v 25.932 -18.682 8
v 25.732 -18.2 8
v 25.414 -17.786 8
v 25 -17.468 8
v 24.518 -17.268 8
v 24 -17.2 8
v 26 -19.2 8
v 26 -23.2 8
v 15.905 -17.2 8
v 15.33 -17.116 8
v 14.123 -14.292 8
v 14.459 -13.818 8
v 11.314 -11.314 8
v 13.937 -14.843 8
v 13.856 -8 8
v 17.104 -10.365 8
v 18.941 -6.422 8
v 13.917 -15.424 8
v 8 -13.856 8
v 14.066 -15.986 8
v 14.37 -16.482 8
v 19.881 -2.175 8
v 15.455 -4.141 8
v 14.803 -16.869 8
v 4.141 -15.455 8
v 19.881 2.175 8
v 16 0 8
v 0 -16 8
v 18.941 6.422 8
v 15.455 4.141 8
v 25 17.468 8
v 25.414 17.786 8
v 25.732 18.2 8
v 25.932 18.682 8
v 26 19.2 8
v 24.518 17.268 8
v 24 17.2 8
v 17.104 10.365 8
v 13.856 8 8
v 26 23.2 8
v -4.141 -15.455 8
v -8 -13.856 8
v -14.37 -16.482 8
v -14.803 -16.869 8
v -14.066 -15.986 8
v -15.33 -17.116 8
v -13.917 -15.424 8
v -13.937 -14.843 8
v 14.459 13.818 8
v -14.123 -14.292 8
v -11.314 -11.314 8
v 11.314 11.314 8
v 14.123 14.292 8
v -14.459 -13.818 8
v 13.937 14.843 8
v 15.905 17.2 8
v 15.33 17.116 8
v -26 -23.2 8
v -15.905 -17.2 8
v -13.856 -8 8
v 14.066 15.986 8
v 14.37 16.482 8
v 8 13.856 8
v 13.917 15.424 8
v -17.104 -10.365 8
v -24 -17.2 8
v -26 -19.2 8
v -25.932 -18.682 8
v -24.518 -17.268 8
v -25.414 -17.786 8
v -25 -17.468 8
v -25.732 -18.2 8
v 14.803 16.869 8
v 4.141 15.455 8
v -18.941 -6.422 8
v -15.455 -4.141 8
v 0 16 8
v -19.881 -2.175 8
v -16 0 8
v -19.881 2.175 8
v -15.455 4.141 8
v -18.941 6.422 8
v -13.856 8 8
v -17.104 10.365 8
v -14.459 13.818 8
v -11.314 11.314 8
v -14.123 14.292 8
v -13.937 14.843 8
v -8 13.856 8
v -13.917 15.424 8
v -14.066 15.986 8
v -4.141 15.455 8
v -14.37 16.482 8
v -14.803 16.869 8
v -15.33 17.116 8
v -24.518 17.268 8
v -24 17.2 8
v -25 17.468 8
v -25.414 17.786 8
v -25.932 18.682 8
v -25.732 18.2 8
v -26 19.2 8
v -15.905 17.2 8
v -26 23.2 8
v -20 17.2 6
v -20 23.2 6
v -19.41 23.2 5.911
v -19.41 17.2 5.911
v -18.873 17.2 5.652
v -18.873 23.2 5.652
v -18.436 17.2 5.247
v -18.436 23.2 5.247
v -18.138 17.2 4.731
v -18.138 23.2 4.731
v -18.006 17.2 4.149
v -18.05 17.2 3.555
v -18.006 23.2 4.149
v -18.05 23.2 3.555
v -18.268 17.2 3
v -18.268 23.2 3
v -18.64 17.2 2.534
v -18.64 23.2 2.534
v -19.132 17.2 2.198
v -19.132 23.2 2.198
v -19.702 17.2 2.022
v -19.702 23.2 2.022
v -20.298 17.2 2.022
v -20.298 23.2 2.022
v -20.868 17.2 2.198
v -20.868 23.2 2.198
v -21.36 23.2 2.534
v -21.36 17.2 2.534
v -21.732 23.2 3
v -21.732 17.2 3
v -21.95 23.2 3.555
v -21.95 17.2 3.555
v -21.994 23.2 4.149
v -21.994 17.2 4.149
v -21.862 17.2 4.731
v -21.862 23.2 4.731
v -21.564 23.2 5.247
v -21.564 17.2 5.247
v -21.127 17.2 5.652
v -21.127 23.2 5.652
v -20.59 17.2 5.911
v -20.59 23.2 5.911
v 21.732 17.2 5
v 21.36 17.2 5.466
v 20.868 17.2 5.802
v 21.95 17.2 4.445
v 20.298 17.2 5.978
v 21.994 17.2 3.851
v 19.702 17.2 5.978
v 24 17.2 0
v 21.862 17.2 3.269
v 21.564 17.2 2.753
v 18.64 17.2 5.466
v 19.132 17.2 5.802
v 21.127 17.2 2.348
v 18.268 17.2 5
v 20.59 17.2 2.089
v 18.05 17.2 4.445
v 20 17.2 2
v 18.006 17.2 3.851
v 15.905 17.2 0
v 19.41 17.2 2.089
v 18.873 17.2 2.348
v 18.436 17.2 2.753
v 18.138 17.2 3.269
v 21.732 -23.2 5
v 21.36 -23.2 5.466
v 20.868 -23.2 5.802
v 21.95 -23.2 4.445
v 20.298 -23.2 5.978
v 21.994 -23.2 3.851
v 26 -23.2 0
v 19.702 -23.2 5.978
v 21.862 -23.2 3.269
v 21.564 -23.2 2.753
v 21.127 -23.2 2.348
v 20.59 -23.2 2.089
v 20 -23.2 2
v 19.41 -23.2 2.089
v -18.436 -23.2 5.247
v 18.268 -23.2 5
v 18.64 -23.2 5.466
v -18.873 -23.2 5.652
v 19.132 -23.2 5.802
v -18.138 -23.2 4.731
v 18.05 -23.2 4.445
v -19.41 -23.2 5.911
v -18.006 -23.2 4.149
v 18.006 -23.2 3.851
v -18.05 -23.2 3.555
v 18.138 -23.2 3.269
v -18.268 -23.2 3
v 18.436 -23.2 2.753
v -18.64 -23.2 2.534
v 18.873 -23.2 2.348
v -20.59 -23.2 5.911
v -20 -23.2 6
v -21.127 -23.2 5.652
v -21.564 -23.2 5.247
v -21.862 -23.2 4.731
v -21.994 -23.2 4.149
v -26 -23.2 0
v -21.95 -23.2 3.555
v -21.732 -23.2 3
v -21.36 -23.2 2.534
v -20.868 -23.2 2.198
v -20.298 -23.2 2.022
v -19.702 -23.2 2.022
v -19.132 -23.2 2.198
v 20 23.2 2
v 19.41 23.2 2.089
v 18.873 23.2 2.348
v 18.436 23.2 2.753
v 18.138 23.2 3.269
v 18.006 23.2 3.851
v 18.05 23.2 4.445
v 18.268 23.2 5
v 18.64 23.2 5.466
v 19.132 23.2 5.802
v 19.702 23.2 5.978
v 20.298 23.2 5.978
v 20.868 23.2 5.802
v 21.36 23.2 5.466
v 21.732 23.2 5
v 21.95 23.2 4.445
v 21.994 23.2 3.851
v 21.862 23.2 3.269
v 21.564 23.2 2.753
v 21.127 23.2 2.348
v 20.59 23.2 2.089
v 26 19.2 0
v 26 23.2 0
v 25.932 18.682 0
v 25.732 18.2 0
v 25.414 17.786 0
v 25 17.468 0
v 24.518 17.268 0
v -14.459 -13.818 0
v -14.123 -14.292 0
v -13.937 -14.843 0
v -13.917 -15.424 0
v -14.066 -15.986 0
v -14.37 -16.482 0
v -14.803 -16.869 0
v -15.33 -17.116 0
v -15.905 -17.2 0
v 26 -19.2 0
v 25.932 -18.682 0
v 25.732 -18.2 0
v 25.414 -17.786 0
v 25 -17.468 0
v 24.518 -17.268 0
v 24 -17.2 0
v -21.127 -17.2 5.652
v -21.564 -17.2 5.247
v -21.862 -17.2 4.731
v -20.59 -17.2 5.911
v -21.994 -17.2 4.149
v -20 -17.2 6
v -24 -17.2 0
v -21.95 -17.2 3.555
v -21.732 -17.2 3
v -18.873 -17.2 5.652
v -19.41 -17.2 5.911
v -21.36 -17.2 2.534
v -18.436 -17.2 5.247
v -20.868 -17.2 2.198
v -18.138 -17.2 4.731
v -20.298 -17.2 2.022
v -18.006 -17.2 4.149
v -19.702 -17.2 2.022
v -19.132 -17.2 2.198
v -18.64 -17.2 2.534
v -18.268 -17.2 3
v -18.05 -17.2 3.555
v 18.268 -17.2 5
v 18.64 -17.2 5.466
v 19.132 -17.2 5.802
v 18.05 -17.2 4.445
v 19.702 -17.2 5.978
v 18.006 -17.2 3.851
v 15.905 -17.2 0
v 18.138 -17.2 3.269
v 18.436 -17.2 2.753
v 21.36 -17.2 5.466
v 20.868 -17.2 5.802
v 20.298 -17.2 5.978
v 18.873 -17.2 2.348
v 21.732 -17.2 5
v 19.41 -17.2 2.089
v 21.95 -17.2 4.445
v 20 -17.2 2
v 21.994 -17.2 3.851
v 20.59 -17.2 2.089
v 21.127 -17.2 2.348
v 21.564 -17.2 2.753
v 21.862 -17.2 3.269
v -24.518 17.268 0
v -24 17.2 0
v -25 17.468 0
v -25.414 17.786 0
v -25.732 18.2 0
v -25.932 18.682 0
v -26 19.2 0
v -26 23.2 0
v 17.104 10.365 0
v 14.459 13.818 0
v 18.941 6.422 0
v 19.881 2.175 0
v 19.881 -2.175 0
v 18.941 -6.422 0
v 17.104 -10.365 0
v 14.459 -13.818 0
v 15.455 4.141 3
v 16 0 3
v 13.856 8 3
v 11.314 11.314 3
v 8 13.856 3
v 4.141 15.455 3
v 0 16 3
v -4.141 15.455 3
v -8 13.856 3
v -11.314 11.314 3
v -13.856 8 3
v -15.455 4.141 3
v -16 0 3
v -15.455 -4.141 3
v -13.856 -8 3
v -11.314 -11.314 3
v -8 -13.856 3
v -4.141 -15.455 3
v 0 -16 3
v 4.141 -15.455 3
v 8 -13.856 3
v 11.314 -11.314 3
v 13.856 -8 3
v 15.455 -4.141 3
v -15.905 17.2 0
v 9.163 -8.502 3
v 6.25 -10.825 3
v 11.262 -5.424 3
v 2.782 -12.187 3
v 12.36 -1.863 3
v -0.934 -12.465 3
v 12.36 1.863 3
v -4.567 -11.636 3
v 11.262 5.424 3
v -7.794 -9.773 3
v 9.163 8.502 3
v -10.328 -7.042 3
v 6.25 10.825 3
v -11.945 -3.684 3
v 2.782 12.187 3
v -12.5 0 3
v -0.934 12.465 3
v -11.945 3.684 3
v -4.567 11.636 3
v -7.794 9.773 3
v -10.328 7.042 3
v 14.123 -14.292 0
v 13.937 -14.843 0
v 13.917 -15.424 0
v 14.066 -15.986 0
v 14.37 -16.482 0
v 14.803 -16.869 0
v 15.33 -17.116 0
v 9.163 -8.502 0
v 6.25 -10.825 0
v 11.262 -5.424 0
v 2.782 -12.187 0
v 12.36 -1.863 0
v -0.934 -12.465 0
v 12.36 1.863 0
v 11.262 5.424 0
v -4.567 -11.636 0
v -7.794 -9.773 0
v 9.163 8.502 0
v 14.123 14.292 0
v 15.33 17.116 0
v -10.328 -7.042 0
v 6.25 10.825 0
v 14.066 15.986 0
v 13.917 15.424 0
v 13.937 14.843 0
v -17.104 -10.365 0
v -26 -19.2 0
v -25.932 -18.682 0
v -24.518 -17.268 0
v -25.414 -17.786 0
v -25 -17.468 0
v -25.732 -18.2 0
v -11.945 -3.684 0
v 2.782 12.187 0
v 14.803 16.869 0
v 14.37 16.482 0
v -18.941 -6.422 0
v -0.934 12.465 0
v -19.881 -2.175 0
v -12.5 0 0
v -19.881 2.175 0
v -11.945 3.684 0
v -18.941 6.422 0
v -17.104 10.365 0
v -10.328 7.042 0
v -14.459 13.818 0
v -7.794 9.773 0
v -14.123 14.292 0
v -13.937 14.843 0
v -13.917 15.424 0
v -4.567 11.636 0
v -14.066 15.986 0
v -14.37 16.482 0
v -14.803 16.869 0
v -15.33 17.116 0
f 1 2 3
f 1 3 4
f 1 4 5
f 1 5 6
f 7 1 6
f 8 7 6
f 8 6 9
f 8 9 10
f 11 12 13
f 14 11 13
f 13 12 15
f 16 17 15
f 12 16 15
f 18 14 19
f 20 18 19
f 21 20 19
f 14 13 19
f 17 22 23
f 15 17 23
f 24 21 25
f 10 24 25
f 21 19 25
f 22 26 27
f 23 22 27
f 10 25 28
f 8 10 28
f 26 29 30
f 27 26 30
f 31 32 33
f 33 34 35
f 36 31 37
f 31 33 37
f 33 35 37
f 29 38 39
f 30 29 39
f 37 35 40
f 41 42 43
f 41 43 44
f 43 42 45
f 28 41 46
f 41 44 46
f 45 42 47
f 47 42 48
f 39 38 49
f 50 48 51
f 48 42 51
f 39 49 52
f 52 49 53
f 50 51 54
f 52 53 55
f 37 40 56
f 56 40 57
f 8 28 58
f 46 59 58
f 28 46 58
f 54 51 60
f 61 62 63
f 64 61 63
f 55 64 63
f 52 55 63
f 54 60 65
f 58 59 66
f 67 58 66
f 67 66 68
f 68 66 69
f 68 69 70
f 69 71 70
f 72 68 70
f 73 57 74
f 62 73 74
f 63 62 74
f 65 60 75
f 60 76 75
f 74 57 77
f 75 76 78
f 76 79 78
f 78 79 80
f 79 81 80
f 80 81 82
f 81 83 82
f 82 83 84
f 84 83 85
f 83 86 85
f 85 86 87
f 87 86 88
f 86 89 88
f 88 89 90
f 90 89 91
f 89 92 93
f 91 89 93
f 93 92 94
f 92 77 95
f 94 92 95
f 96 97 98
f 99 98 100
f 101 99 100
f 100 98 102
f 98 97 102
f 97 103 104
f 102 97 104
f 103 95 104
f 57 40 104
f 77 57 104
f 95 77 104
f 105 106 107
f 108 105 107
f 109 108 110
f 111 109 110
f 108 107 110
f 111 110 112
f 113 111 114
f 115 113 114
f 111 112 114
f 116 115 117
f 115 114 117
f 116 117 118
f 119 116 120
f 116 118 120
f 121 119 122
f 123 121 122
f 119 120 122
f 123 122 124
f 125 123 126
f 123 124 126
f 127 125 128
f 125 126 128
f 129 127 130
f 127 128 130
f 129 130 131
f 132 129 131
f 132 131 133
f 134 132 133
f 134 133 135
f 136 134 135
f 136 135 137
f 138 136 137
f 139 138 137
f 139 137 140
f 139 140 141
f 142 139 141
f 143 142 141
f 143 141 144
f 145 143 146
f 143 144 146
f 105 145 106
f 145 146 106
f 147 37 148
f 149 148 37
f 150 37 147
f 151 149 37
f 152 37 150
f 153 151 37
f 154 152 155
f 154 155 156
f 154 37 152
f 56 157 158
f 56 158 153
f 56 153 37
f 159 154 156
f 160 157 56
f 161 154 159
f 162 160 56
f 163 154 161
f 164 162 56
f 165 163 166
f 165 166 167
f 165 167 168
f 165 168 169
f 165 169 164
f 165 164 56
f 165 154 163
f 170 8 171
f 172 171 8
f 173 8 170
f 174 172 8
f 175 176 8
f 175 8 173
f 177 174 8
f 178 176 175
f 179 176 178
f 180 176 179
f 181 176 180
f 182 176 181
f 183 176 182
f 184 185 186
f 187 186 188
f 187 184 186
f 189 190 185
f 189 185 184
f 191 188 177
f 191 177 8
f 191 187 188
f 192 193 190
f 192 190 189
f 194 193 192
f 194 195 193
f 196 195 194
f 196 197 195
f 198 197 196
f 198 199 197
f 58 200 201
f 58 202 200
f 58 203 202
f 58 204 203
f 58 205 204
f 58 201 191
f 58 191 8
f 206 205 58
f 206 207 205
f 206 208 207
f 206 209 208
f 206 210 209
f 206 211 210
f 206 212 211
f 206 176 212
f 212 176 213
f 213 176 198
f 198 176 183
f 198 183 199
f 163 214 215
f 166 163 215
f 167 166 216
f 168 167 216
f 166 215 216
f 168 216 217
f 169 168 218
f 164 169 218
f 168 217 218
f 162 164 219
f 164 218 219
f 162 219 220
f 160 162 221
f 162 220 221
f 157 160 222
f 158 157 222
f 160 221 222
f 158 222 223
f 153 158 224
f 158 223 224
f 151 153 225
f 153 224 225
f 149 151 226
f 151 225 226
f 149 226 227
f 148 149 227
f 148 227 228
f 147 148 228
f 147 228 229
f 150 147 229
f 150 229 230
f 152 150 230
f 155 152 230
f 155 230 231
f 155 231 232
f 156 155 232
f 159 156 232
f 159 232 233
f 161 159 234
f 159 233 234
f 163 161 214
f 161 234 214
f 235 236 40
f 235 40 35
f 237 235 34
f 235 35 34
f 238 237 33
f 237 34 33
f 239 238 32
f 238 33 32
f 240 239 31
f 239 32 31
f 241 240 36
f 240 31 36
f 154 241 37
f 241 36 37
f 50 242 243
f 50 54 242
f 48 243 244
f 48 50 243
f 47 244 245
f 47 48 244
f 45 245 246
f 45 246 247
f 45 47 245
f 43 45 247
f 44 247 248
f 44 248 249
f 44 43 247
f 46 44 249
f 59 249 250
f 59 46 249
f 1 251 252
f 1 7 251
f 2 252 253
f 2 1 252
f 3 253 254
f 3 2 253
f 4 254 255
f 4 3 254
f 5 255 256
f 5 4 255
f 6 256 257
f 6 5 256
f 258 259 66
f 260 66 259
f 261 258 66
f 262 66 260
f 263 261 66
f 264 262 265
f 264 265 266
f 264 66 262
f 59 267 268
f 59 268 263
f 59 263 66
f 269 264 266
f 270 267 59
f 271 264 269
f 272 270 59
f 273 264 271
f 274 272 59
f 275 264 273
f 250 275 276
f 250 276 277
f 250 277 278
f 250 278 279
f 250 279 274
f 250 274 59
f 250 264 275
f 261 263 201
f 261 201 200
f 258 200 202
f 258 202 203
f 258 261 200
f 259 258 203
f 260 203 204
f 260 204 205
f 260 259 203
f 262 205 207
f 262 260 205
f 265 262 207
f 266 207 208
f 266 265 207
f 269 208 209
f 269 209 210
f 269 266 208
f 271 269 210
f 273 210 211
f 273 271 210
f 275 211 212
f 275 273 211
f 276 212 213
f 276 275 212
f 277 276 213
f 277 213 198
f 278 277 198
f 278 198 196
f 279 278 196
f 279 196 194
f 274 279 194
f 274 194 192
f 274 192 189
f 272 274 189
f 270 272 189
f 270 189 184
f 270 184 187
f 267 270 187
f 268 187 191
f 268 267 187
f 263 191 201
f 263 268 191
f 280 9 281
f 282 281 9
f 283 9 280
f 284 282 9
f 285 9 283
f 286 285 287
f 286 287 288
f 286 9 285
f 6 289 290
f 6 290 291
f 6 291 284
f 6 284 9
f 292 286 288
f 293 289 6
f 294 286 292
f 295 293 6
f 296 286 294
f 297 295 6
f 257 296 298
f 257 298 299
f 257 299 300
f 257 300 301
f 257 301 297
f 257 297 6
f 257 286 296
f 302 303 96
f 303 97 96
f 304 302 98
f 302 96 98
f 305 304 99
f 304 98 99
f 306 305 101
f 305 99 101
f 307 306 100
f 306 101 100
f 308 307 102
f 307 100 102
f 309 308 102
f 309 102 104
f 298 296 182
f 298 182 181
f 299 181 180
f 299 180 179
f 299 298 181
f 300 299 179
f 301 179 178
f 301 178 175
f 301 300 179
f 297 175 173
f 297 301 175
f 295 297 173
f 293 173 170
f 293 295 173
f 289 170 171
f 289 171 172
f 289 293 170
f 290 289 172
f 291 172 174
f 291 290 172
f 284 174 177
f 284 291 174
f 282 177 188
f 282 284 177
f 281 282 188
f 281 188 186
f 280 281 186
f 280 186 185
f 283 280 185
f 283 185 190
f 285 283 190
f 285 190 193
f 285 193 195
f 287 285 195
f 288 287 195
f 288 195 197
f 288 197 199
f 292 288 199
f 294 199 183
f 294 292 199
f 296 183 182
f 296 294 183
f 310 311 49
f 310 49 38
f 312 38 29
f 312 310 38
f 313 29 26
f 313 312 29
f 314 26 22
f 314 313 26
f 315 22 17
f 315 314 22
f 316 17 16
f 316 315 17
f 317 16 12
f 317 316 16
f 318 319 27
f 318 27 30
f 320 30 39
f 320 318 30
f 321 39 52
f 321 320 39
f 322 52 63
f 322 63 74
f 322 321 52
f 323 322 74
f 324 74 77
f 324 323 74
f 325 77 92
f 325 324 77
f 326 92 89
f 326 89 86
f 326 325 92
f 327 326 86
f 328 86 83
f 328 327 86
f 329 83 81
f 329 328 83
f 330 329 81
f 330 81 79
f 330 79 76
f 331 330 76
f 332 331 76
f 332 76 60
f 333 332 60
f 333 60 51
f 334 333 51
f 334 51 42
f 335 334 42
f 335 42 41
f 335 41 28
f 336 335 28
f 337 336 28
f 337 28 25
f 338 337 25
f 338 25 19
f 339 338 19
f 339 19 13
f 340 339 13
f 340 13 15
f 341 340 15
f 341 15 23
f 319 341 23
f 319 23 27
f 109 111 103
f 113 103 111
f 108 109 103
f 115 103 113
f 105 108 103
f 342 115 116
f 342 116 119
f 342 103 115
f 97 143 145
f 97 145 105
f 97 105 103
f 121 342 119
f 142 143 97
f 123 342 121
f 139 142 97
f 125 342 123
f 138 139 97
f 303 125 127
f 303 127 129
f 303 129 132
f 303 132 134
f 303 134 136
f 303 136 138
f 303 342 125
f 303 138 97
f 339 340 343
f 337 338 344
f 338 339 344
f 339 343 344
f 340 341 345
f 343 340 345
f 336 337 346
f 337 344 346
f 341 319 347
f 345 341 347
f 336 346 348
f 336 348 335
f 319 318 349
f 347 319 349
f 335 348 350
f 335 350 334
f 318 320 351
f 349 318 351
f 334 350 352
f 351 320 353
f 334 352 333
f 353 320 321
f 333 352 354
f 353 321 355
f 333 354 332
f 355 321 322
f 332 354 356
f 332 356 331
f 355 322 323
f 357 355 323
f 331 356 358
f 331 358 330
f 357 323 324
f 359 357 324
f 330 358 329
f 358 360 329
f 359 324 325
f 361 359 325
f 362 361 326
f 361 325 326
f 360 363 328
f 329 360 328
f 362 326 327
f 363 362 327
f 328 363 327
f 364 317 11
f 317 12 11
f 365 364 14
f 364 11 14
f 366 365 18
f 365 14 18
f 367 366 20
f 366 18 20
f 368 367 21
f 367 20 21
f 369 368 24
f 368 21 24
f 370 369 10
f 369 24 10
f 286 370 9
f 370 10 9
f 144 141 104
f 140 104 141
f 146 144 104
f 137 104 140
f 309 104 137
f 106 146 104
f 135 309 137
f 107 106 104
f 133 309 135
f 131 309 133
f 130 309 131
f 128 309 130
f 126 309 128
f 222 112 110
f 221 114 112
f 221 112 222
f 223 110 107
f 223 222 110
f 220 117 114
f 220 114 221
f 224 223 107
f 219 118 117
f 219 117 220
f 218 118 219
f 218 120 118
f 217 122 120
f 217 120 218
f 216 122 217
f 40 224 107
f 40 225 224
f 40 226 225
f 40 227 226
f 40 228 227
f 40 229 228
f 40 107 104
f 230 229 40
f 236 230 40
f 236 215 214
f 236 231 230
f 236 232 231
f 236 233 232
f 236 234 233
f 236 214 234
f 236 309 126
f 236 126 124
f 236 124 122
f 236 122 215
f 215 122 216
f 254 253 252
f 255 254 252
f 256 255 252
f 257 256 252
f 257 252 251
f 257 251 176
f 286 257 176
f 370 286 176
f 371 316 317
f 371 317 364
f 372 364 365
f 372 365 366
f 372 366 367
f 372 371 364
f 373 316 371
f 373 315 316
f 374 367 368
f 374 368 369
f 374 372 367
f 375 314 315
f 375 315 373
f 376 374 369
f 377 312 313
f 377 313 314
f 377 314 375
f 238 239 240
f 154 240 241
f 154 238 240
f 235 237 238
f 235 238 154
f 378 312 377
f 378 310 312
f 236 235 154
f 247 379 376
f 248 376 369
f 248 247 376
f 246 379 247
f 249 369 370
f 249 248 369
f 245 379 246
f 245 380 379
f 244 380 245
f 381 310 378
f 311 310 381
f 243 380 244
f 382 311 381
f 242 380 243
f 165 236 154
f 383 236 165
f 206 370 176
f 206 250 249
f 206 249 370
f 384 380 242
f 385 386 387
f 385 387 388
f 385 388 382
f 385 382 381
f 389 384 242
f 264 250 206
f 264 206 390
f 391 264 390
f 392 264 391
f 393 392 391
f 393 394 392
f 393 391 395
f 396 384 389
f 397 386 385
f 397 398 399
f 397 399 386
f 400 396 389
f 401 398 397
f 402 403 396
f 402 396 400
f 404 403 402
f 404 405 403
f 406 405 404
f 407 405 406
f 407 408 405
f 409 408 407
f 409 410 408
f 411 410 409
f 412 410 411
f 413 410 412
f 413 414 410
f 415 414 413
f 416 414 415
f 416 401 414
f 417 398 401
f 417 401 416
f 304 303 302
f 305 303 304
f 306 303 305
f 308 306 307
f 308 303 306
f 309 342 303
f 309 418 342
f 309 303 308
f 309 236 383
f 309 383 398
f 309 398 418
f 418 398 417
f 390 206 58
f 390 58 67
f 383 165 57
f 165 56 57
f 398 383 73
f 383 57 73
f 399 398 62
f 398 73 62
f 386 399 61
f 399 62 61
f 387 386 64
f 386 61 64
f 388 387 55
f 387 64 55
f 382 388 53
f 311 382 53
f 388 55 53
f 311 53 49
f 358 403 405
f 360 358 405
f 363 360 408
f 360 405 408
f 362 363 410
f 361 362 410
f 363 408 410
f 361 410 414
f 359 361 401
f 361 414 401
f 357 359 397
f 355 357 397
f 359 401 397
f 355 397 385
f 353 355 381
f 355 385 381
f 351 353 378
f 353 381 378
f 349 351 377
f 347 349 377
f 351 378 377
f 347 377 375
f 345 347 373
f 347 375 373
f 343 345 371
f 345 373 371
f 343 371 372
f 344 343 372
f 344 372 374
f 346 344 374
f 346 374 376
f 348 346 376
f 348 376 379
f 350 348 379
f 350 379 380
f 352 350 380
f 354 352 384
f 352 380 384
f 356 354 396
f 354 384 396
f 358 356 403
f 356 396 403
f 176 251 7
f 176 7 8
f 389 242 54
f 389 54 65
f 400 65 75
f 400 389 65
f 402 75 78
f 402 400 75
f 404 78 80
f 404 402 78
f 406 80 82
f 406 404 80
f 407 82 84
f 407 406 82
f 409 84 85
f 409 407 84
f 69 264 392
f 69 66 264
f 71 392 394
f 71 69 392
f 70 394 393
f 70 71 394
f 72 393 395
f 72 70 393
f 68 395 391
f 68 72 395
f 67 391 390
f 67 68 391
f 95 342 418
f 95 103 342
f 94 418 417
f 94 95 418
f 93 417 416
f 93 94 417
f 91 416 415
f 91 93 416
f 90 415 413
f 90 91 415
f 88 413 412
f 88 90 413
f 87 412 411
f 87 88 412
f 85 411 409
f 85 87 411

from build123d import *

# Parameters (mm, degrees)
SKETCH_1_R          = 16
EXTRUDE_1_DEPTH     = 8
SKETCH_2_R          = 2
CUT_EXTRUDE_1_DEPTH = 6
CUT_EXTRUDE_START   = -6
SKETCH_3_R          = 2
CUT_EXTRUDE_2_DEPTH = 6
FILLET_1_R          = 2
FILLET_2_R          = 2
SKETCH_4_R          = 16
SKETCH_4_R_2        = 12.5
EXTRUDE_2_DEPTH     = 3


with BuildPart() as part:
    # 草图1 → 凸台-拉伸1 (new body)
    with BuildSketch(Plane.XY):
        with BuildLine():
            Line((-26, 23.2), (26, 23.2))
            Line((26, 23.2), (26, 17.2))
            Line((26, 17.2), (10.205880658, 17.2))
            ThreePointArc((10.205880658, 17.2), (20, 0), (10.205880658, -17.2))
            Line((10.205880658, -17.2), (26, -17.2))
            Line((26, -17.2), (26, -23.2))
            Line((26, -23.2), (-26, -23.2))
            Line((-26, -23.2), (-26, -17.2))
            Line((-26, -17.2), (-10.205880658, -17.2))
            ThreePointArc((-10.205880658, -17.2), (-20, 0), (-10.205880658, 17.2))
            Line((-10.205880658, 17.2), (-26, 17.2))
            Line((-26, 17.2), (-26, 23.2))
        make_face()
        Circle(SKETCH_1_R, mode=Mode.SUBTRACT)
    extrude(amount=EXTRUDE_1_DEPTH)

    # 草图2 → 切除-拉伸1 (cut)
    with BuildSketch(Plane(origin=(0, 23.2, 0), x_dir=(1, 0, 0), z_dir=(0, 1, 0))):
        with Locations(Location((-20, -4, 0), (0, 0, 270))):
            Circle(SKETCH_2_R)
        with Locations(Location((20, -4, 0), (0, 0, 90))):
            Circle(SKETCH_2_R)
    extrude(amount=-CUT_EXTRUDE_1_DEPTH, mode=Mode.SUBTRACT)

    # 草图3 → 切除-拉伸2 (cut)
    with BuildSketch(Plane.XZ.offset(23.2).offset(CUT_EXTRUDE_START)):
        with Locations(Location((20, 4, 0), (0, 0, 270))):
            Circle(SKETCH_3_R)
        with Locations(Location((-20, 4, 0), (0, 0, 90))):
            Circle(SKETCH_3_R)
    extrude(amount=CUT_EXTRUDE_2_DEPTH, mode=Mode.SUBTRACT)

    # 圆角1
    fillet_1_edges = [part.edges().sort_by_distance(p)[0] for p in [
        (-10.205880658, -17.2, 4),
        (-10.205880658, 17.2, 4),
        (10.205880658, 17.2, 4),
        (10.205880658, -17.2, 4),
    ]]
    fillet(fillet_1_edges, radius=FILLET_1_R)

    # 圆角2
    fillet_2_edges = [part.edges().sort_by_distance(p)[0] for p in [
        (-26, -17.2, 4),
        (-26, 17.2, 4),
        (26, 17.2, 4),
        (26, -17.2, 4),
    ]]
    fillet(fillet_2_edges, radius=FILLET_2_R)

    # 草图4 → 凸台-拉伸2 (add)
    with BuildSketch(Plane(origin=(0, 0, 0), x_dir=(-1, 0, 0), z_dir=(0, 0, -1))):
        Circle(SKETCH_4_R)
        Circle(SKETCH_4_R_2, mode=Mode.SUBTRACT)
    extrude(amount=-EXTRUDE_2_DEPTH)


solid = part.part
